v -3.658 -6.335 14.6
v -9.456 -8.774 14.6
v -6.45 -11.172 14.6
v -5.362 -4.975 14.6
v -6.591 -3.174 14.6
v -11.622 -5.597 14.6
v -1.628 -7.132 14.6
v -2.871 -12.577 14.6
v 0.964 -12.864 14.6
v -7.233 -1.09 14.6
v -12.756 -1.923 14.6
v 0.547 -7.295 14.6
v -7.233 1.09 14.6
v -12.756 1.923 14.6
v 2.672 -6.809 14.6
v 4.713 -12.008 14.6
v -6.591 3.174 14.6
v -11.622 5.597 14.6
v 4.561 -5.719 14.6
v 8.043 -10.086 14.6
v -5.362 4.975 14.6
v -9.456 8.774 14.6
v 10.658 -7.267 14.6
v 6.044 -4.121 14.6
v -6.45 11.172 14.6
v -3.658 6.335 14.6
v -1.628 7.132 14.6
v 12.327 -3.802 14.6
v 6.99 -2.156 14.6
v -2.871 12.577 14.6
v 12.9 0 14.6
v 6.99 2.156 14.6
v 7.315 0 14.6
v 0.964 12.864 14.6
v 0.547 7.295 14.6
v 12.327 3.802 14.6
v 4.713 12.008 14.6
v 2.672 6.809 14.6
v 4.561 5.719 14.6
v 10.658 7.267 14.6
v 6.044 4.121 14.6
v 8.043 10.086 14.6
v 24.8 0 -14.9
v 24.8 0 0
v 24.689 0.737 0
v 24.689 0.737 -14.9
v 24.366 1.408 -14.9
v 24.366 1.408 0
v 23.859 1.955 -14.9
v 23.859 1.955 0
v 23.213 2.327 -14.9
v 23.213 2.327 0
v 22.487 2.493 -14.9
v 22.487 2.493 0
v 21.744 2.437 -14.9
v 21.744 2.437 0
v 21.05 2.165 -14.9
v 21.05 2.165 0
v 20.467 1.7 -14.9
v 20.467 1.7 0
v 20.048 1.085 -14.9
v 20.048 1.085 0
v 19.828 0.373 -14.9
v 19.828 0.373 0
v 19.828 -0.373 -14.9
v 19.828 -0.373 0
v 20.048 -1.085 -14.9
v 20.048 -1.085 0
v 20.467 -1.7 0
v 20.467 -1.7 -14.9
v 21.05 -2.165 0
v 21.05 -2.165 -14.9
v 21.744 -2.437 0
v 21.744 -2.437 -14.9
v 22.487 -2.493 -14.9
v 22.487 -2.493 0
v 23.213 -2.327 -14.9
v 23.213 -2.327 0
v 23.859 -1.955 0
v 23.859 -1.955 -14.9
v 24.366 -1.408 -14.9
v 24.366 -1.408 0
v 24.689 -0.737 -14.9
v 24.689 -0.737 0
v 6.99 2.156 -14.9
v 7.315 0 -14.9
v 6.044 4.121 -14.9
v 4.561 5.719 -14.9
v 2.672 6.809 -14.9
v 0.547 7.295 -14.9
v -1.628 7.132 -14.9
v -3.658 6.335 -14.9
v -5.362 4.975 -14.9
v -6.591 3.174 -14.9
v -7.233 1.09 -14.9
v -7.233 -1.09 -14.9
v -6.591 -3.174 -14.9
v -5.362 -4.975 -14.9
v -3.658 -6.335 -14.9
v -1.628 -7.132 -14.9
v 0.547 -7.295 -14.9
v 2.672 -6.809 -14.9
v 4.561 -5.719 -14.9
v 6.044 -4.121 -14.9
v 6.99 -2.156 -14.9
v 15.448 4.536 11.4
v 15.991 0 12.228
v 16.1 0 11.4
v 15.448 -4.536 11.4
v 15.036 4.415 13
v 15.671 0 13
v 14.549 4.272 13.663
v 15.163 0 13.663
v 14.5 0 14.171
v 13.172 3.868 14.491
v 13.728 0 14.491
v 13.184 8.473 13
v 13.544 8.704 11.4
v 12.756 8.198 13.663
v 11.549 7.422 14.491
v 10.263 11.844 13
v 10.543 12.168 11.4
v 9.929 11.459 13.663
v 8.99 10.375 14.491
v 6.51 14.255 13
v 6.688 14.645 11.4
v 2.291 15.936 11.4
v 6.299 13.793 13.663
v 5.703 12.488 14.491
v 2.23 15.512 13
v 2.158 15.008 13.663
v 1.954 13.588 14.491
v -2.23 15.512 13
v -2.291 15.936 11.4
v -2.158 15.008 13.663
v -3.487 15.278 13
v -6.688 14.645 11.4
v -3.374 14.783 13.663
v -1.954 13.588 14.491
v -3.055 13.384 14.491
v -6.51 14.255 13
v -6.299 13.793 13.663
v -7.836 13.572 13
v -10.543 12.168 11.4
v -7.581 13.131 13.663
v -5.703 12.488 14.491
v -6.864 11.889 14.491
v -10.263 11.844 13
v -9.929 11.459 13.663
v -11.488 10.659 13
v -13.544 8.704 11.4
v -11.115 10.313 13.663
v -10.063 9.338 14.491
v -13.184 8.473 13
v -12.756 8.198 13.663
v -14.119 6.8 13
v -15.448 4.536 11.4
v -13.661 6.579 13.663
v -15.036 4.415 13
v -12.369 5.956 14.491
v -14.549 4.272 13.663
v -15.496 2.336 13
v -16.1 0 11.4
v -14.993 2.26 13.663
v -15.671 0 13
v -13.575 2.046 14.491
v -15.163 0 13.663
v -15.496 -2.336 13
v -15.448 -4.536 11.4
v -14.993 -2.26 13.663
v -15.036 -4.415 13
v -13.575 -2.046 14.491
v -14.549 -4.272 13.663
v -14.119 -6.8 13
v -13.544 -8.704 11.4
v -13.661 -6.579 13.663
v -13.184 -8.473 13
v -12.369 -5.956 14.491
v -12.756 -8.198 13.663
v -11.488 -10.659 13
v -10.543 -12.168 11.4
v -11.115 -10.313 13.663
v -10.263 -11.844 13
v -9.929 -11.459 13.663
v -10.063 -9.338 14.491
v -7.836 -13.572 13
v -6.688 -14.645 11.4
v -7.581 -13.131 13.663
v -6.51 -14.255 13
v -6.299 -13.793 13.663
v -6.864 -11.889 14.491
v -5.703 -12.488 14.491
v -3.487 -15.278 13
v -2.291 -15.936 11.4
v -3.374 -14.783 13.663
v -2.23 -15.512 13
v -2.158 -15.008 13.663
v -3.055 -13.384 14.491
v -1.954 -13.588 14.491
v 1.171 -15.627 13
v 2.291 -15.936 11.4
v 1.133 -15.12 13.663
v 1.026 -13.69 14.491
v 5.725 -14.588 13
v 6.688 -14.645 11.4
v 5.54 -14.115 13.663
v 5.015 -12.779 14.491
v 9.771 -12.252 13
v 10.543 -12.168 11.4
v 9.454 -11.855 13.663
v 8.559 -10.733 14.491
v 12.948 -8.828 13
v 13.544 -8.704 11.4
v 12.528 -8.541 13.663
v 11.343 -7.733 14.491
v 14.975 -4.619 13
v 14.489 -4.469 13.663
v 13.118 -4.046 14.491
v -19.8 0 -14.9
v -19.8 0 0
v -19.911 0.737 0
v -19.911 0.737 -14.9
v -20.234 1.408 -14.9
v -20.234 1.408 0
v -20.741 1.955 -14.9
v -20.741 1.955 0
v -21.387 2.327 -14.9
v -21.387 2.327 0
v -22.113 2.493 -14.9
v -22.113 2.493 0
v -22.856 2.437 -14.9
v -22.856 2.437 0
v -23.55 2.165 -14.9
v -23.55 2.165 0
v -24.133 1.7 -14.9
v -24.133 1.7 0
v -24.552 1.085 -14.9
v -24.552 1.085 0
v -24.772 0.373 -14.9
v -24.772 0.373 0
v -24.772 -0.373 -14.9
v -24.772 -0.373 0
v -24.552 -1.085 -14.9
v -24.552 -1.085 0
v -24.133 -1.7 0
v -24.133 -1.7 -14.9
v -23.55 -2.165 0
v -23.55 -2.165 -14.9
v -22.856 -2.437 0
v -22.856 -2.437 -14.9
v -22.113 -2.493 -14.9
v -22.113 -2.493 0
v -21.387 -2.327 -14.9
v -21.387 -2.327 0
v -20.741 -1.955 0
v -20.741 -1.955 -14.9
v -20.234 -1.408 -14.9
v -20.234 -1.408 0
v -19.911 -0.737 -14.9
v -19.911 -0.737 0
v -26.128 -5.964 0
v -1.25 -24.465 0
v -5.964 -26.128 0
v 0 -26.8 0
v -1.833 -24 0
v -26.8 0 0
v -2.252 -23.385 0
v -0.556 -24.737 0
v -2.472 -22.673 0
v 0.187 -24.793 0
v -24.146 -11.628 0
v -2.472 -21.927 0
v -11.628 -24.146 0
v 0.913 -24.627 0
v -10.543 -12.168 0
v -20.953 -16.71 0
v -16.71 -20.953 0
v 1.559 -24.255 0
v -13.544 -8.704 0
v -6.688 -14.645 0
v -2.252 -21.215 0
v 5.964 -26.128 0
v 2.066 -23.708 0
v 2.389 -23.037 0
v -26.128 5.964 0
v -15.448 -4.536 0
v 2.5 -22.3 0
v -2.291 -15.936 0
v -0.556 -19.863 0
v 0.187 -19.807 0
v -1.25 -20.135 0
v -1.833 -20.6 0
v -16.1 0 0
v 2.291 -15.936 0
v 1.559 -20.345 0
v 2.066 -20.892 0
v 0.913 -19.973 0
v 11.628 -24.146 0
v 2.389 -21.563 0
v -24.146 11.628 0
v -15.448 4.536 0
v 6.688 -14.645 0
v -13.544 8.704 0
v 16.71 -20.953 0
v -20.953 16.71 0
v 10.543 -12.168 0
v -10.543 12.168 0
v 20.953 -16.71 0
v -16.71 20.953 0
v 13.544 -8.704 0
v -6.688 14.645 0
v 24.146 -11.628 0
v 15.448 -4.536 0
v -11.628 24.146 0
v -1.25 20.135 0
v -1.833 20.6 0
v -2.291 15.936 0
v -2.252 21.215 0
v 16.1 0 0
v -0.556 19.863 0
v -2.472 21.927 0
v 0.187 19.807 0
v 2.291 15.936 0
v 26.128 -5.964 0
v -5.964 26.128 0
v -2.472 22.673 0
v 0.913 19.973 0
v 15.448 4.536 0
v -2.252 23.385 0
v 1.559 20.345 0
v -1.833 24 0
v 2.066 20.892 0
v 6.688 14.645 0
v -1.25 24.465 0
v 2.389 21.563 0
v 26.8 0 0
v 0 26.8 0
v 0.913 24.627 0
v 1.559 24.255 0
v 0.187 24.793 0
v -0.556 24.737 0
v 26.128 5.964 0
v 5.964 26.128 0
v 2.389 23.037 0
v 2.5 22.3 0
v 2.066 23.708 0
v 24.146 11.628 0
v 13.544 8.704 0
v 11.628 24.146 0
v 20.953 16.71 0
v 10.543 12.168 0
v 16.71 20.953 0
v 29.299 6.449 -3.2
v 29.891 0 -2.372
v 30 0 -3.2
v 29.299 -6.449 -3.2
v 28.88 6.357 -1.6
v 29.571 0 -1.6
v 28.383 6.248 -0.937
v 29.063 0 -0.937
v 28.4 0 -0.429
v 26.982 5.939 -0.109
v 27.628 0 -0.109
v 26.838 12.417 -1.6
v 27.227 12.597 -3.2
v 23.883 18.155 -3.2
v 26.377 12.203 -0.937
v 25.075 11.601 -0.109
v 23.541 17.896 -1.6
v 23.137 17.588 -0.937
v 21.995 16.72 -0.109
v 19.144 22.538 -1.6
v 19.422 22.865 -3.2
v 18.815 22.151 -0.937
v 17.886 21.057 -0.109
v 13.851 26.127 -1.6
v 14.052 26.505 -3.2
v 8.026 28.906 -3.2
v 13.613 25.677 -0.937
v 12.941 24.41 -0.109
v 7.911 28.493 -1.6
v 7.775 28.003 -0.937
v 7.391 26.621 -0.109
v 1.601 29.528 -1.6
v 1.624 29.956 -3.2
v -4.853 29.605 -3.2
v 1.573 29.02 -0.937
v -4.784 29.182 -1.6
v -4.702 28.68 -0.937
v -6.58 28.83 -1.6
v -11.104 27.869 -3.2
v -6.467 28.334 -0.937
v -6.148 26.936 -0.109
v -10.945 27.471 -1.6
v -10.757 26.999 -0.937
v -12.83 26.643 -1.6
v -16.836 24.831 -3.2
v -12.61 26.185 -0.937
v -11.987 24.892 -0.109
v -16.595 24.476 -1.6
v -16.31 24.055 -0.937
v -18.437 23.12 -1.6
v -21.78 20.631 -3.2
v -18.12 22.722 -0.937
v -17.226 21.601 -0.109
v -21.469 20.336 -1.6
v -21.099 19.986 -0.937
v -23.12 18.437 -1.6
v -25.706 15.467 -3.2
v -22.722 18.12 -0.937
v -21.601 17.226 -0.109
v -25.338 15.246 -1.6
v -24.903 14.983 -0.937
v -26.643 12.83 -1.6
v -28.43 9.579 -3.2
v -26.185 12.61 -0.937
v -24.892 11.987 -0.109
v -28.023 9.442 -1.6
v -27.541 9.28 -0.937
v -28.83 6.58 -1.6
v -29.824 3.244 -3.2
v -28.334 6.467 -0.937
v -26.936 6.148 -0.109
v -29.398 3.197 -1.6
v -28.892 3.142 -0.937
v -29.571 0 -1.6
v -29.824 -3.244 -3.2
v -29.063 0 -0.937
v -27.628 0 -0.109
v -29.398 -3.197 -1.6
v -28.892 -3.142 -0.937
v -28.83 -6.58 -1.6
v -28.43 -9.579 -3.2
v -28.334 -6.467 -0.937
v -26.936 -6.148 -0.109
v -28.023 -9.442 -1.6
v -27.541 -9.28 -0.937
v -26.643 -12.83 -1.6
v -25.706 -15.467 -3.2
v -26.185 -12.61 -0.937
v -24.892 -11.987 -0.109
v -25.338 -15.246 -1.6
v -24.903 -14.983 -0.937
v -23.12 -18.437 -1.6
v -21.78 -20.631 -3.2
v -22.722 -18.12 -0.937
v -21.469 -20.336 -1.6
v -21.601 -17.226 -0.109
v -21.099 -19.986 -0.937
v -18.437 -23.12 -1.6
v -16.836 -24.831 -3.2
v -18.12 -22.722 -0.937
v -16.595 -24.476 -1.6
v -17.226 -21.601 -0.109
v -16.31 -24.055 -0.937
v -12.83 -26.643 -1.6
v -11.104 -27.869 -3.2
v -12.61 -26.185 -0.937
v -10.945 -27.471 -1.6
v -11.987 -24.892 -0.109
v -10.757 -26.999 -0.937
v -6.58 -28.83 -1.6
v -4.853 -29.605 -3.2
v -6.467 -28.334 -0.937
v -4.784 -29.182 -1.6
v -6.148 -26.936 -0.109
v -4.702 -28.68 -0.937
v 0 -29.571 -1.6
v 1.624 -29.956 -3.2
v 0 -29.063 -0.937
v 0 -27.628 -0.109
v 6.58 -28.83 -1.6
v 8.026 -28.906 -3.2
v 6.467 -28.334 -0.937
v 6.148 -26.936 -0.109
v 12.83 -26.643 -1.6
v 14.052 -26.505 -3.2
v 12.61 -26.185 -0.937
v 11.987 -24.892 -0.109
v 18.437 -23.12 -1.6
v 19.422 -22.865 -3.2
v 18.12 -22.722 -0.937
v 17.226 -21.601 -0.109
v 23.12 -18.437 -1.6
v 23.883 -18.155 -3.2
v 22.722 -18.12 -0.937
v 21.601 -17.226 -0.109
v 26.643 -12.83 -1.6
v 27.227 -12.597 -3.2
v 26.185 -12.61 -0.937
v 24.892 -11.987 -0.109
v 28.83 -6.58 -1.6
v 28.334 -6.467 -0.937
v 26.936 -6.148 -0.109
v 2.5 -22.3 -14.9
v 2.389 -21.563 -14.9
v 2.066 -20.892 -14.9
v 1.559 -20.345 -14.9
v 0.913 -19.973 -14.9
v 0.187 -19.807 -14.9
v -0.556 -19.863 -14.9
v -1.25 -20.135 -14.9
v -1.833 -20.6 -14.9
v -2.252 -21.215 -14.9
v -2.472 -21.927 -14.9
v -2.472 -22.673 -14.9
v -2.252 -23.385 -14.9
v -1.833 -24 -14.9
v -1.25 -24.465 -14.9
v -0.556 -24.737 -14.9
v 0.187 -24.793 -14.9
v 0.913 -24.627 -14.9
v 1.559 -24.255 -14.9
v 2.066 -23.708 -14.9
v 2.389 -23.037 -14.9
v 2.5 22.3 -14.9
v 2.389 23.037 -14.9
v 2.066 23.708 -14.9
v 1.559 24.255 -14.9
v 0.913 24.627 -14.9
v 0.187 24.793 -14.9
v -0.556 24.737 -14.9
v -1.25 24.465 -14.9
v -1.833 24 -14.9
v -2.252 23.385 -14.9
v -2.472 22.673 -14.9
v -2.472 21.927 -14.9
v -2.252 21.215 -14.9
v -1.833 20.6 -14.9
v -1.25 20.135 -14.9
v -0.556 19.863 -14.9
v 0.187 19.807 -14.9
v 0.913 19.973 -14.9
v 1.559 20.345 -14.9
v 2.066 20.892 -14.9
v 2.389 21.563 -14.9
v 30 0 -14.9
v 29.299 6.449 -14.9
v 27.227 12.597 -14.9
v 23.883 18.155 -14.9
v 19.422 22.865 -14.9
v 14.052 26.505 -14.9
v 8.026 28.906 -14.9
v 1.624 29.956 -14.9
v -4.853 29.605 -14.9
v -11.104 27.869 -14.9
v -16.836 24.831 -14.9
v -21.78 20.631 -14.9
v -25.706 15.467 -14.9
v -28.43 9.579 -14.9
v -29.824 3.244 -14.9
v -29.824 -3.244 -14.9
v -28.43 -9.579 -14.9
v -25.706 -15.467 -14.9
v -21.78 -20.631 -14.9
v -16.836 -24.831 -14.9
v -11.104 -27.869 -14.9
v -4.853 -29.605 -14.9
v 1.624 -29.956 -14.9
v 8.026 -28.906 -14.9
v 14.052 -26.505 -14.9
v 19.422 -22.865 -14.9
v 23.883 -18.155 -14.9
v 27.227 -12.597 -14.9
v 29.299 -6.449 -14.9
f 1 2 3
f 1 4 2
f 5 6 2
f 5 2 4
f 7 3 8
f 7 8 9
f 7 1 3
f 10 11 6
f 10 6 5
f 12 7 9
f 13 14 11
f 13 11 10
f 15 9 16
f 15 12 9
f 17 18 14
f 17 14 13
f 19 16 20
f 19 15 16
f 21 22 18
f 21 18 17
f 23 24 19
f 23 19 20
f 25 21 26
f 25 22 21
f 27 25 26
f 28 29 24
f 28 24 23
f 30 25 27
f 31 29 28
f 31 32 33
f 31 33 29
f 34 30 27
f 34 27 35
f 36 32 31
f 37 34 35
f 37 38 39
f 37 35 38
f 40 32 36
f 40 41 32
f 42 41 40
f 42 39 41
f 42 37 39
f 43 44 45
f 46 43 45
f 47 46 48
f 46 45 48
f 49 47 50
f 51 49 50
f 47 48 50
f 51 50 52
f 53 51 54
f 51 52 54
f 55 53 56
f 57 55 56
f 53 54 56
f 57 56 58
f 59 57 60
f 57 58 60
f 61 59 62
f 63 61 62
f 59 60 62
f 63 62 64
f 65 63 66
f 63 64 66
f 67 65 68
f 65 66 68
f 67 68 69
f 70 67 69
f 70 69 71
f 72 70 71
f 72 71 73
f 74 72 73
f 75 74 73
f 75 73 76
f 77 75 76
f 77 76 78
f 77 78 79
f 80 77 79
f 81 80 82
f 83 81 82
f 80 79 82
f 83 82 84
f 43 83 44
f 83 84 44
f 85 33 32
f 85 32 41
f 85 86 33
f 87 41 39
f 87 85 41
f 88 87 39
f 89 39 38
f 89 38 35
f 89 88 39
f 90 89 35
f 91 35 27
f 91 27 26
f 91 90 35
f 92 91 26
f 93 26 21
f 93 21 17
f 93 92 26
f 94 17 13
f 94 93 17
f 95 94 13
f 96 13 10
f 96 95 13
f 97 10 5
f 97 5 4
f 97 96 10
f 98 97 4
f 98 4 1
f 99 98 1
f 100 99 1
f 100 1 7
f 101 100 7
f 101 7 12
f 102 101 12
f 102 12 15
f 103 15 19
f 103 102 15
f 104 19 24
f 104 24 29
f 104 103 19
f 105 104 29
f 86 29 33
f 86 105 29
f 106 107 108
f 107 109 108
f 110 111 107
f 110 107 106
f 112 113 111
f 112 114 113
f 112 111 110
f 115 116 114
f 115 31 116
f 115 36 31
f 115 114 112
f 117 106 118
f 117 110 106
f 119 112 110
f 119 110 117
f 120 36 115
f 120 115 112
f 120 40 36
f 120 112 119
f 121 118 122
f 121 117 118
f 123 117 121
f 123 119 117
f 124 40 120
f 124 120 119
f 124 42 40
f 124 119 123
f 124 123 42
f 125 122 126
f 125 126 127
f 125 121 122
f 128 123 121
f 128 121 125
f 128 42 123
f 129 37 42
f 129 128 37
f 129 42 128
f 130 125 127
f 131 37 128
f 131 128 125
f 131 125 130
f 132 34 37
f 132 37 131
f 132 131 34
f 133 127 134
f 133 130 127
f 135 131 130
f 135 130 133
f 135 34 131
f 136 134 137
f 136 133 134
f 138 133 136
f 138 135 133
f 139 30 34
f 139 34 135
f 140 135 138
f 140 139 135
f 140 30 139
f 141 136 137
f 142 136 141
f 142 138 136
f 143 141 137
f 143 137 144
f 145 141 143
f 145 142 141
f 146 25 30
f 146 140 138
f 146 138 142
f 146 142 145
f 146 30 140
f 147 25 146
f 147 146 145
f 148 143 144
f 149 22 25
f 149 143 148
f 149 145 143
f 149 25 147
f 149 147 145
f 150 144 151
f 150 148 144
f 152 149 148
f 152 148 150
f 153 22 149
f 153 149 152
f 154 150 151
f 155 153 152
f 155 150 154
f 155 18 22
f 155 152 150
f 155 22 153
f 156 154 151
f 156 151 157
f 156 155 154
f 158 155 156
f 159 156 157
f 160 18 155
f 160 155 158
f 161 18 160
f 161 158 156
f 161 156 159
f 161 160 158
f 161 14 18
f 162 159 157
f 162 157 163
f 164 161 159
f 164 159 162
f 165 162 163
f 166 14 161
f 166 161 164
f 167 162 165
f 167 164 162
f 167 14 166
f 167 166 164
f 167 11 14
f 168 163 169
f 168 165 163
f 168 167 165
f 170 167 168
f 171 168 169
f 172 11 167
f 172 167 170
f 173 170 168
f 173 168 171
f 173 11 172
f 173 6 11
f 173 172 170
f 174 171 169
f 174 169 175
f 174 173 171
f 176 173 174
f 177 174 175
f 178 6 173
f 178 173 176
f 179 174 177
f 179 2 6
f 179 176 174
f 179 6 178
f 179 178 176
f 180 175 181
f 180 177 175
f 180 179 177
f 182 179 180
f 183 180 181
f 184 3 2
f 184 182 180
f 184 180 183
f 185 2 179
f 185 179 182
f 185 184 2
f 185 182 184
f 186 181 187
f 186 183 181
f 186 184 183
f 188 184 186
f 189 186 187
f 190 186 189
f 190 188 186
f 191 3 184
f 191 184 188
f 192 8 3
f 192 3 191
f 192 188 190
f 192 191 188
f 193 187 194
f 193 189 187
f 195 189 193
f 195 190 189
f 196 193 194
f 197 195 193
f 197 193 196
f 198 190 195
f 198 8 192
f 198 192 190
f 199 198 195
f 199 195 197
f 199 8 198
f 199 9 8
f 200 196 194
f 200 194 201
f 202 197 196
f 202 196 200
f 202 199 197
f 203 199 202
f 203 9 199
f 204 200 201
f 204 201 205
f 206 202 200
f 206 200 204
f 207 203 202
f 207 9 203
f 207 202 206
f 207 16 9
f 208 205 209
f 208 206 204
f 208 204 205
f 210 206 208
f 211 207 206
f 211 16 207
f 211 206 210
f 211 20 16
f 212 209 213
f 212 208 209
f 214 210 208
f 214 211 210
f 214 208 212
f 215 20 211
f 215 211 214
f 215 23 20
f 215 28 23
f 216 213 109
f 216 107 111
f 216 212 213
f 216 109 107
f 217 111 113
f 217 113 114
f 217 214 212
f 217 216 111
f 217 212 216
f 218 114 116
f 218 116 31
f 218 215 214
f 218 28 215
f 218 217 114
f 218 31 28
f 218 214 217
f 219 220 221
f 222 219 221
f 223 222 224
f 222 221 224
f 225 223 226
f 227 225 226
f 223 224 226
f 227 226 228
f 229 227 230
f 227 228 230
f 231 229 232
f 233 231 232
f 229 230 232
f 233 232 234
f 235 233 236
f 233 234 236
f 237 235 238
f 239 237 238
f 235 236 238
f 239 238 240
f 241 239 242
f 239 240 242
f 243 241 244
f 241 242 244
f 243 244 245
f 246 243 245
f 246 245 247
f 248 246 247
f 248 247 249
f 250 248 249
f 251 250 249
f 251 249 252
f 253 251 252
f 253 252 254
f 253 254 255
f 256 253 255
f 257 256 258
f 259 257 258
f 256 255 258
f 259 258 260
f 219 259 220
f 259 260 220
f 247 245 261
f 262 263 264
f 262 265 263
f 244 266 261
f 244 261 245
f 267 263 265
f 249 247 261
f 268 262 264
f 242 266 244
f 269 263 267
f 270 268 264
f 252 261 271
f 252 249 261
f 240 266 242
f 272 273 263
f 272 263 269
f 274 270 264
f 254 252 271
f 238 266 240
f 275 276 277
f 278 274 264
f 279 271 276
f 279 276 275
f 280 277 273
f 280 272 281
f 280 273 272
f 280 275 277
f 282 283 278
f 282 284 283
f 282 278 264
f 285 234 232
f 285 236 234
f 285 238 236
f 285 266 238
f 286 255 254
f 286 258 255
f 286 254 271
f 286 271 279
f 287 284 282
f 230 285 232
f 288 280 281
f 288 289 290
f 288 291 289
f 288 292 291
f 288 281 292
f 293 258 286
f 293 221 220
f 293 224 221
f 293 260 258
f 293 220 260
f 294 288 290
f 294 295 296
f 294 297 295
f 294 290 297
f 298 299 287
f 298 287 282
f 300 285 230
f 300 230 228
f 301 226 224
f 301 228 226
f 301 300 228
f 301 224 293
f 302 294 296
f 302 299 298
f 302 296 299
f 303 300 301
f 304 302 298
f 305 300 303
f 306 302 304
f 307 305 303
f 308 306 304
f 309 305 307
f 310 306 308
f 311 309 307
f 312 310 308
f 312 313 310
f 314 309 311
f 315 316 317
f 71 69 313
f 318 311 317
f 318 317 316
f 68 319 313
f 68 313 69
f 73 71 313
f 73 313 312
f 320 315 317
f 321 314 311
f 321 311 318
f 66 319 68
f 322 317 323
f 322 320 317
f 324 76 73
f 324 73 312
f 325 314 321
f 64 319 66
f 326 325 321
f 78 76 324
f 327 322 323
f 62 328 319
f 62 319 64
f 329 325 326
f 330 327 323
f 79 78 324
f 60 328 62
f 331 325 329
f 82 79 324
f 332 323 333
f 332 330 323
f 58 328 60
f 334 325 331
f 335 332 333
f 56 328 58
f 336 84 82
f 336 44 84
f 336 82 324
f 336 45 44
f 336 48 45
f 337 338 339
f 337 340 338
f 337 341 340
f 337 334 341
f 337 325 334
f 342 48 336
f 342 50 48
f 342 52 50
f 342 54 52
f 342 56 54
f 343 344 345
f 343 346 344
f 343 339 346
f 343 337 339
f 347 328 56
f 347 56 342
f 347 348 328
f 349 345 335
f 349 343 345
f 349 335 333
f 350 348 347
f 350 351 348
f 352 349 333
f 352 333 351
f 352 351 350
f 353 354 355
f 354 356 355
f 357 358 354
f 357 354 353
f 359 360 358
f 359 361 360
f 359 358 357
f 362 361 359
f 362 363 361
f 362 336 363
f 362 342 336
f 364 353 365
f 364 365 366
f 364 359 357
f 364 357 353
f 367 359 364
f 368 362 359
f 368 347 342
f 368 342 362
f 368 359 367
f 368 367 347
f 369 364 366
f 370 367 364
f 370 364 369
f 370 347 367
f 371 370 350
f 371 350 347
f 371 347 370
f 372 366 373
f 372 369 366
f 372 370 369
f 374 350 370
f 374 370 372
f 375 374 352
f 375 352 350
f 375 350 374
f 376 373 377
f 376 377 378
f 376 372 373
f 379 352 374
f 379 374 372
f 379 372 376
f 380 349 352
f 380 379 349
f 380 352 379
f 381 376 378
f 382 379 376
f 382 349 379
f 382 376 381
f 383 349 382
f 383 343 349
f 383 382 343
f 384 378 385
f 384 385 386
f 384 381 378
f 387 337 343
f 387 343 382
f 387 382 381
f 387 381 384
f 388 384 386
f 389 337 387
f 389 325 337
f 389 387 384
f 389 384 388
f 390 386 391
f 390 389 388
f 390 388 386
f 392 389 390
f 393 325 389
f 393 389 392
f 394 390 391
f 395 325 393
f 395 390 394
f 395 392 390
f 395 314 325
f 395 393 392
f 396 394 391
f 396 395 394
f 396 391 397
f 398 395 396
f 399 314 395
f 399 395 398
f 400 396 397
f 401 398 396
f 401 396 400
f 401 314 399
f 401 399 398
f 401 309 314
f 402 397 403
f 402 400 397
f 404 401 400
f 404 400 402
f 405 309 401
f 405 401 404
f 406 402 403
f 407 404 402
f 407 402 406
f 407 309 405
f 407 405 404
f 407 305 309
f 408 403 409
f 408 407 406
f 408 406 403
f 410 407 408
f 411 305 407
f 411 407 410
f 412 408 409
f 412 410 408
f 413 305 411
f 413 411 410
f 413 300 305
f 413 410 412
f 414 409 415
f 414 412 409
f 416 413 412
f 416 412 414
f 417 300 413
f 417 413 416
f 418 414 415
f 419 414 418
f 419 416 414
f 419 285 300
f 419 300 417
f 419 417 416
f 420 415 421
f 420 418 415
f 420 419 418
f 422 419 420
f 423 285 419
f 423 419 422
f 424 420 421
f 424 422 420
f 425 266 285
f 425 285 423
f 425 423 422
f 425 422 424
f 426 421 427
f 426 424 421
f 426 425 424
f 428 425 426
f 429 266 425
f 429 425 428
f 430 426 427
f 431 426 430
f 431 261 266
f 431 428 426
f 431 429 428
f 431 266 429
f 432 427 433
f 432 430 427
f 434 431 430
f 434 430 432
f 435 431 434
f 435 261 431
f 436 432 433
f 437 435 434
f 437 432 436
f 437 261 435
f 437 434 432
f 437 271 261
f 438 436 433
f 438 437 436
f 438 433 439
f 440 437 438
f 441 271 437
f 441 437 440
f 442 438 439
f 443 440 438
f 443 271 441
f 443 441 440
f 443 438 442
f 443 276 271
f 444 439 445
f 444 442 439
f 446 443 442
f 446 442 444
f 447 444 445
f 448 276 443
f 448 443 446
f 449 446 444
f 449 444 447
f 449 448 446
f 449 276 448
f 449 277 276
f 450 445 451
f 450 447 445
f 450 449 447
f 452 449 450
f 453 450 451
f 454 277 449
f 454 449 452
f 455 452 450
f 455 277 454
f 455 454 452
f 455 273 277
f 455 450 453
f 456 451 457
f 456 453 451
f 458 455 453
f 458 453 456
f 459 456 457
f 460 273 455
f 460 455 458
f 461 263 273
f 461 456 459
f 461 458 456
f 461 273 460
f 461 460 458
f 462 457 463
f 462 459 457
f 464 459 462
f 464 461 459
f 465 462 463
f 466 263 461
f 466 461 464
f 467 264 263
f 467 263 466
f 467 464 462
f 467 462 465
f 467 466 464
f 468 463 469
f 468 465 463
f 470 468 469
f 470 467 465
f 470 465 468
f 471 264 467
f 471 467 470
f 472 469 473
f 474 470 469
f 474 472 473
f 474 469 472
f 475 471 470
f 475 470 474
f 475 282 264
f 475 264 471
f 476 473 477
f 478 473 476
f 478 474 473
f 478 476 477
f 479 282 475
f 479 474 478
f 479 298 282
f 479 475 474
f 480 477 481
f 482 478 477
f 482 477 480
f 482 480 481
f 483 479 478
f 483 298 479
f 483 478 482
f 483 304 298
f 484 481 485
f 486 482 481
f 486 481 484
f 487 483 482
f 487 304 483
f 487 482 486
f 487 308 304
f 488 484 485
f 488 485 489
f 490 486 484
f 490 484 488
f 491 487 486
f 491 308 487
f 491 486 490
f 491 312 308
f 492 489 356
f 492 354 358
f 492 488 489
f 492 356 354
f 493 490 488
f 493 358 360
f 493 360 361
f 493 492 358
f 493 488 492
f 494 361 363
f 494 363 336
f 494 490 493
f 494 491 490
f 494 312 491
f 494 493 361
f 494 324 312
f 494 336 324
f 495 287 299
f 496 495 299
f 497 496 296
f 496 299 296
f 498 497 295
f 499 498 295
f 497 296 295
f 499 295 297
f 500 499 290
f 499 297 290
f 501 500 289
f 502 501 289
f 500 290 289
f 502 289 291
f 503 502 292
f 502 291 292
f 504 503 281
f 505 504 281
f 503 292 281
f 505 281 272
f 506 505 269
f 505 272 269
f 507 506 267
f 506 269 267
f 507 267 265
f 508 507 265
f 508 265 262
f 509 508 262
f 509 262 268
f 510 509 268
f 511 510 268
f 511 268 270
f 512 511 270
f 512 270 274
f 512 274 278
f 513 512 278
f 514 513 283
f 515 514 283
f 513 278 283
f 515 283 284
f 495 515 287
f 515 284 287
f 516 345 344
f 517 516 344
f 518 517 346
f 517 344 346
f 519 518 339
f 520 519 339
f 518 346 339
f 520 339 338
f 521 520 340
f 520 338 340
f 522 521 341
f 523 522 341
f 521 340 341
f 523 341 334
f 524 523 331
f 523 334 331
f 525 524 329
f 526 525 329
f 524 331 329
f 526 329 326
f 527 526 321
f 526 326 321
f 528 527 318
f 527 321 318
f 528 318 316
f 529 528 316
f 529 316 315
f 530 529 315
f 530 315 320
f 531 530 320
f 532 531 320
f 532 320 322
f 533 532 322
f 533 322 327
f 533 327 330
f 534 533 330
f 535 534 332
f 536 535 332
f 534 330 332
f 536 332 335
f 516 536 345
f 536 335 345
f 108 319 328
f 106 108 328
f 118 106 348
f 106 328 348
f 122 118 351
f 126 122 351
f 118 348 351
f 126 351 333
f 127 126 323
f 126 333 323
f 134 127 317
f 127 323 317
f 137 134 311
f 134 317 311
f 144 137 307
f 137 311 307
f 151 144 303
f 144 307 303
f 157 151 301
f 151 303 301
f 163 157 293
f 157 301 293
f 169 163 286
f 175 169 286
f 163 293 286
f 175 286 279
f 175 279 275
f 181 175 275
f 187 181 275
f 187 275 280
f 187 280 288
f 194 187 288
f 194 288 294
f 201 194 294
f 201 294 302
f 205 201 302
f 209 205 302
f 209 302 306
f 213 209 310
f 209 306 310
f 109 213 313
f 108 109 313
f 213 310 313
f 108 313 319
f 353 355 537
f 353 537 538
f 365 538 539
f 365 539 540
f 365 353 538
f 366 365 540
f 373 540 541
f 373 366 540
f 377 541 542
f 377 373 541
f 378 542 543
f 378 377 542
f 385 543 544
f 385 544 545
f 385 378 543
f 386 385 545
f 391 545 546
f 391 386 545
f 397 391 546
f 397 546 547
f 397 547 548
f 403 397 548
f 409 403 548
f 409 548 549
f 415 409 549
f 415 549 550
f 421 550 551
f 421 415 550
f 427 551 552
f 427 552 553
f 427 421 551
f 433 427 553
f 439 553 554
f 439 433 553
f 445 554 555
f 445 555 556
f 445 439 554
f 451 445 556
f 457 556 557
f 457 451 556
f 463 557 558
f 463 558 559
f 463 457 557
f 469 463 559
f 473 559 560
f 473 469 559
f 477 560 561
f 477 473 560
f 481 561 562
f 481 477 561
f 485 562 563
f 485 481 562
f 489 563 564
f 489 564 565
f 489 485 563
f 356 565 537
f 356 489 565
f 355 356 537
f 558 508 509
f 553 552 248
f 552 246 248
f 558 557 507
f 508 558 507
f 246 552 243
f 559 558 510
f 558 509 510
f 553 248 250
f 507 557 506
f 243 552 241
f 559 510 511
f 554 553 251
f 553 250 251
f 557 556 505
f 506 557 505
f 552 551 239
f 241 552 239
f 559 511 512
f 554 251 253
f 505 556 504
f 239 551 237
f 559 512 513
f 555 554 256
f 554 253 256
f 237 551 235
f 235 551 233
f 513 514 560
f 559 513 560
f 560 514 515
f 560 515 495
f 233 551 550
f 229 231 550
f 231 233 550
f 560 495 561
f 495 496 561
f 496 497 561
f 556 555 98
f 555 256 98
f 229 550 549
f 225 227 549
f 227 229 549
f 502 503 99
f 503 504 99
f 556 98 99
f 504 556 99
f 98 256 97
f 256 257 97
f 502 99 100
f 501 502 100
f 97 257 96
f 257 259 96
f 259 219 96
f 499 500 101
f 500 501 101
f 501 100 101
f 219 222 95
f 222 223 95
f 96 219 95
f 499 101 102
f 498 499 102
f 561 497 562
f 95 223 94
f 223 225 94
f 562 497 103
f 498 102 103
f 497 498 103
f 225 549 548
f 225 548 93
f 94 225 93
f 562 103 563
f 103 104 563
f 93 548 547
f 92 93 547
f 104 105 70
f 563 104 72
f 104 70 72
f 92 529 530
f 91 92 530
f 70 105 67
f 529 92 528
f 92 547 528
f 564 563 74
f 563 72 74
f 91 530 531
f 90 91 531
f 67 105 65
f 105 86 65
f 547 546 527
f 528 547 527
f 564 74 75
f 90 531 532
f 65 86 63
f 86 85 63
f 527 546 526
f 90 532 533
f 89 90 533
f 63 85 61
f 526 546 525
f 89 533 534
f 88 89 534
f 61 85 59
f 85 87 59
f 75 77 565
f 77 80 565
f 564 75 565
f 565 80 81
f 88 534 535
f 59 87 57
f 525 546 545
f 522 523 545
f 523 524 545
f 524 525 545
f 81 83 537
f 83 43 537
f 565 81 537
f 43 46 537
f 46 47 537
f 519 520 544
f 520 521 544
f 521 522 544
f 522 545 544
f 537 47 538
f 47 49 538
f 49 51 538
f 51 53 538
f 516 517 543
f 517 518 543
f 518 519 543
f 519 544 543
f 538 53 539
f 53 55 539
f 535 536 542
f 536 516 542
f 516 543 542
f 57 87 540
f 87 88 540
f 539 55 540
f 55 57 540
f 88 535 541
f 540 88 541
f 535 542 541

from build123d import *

# Parameters (mm, degrees)
F0_R     = 30
F0_R_2   = 2.5
F0_R_3   = 16.1
F0_R_4   = 7.315
F1_DEPTH = 14.9
F2_R     = 3.2
F3_DEPTH = 14.6
F4_R     = 3.2


with BuildPart() as f1:
    # F0 (on Top) → F1 (new body)
    with BuildSketch(Plane.XY):
        Circle(F0_R)
        with Locations((0, -22.3)):
            Circle(F0_R_2, mode=Mode.SUBTRACT)
        with Locations((-22.3, 0)):
            Circle(F0_R_2, mode=Mode.SUBTRACT)
        Circle(F0_R_3, mode=Mode.SUBTRACT)
        with Locations((22.3, 0)):
            Circle(F0_R_2, mode=Mode.SUBTRACT)
        with Locations((0, 22.3)):
            Circle(F0_R_2, mode=Mode.SUBTRACT)
        Circle(F0_R_3)
        Circle(F0_R_4, mode=Mode.SUBTRACT)
    extrude(amount=-F1_DEPTH)

    # F2
    f2_edges = [f1.edges().sort_by_distance(p)[0] for p in [
        (-30, 0, 0),
    ]]
    fillet(f2_edges, radius=F2_R)

    # F0 (on Top) → F3 (join)
    with BuildSketch(Plane.XY):
        Circle(F0_R_3)
        Circle(F0_R_4, mode=Mode.SUBTRACT)
    extrude(amount=F3_DEPTH)

    # F4
    f4_edges = [f1.edges().sort_by_distance(p)[0] for p in [
        (-16.1, 0, 14.6),
    ]]
    fillet(f4_edges, radius=F4_R)


solid = f1.part
